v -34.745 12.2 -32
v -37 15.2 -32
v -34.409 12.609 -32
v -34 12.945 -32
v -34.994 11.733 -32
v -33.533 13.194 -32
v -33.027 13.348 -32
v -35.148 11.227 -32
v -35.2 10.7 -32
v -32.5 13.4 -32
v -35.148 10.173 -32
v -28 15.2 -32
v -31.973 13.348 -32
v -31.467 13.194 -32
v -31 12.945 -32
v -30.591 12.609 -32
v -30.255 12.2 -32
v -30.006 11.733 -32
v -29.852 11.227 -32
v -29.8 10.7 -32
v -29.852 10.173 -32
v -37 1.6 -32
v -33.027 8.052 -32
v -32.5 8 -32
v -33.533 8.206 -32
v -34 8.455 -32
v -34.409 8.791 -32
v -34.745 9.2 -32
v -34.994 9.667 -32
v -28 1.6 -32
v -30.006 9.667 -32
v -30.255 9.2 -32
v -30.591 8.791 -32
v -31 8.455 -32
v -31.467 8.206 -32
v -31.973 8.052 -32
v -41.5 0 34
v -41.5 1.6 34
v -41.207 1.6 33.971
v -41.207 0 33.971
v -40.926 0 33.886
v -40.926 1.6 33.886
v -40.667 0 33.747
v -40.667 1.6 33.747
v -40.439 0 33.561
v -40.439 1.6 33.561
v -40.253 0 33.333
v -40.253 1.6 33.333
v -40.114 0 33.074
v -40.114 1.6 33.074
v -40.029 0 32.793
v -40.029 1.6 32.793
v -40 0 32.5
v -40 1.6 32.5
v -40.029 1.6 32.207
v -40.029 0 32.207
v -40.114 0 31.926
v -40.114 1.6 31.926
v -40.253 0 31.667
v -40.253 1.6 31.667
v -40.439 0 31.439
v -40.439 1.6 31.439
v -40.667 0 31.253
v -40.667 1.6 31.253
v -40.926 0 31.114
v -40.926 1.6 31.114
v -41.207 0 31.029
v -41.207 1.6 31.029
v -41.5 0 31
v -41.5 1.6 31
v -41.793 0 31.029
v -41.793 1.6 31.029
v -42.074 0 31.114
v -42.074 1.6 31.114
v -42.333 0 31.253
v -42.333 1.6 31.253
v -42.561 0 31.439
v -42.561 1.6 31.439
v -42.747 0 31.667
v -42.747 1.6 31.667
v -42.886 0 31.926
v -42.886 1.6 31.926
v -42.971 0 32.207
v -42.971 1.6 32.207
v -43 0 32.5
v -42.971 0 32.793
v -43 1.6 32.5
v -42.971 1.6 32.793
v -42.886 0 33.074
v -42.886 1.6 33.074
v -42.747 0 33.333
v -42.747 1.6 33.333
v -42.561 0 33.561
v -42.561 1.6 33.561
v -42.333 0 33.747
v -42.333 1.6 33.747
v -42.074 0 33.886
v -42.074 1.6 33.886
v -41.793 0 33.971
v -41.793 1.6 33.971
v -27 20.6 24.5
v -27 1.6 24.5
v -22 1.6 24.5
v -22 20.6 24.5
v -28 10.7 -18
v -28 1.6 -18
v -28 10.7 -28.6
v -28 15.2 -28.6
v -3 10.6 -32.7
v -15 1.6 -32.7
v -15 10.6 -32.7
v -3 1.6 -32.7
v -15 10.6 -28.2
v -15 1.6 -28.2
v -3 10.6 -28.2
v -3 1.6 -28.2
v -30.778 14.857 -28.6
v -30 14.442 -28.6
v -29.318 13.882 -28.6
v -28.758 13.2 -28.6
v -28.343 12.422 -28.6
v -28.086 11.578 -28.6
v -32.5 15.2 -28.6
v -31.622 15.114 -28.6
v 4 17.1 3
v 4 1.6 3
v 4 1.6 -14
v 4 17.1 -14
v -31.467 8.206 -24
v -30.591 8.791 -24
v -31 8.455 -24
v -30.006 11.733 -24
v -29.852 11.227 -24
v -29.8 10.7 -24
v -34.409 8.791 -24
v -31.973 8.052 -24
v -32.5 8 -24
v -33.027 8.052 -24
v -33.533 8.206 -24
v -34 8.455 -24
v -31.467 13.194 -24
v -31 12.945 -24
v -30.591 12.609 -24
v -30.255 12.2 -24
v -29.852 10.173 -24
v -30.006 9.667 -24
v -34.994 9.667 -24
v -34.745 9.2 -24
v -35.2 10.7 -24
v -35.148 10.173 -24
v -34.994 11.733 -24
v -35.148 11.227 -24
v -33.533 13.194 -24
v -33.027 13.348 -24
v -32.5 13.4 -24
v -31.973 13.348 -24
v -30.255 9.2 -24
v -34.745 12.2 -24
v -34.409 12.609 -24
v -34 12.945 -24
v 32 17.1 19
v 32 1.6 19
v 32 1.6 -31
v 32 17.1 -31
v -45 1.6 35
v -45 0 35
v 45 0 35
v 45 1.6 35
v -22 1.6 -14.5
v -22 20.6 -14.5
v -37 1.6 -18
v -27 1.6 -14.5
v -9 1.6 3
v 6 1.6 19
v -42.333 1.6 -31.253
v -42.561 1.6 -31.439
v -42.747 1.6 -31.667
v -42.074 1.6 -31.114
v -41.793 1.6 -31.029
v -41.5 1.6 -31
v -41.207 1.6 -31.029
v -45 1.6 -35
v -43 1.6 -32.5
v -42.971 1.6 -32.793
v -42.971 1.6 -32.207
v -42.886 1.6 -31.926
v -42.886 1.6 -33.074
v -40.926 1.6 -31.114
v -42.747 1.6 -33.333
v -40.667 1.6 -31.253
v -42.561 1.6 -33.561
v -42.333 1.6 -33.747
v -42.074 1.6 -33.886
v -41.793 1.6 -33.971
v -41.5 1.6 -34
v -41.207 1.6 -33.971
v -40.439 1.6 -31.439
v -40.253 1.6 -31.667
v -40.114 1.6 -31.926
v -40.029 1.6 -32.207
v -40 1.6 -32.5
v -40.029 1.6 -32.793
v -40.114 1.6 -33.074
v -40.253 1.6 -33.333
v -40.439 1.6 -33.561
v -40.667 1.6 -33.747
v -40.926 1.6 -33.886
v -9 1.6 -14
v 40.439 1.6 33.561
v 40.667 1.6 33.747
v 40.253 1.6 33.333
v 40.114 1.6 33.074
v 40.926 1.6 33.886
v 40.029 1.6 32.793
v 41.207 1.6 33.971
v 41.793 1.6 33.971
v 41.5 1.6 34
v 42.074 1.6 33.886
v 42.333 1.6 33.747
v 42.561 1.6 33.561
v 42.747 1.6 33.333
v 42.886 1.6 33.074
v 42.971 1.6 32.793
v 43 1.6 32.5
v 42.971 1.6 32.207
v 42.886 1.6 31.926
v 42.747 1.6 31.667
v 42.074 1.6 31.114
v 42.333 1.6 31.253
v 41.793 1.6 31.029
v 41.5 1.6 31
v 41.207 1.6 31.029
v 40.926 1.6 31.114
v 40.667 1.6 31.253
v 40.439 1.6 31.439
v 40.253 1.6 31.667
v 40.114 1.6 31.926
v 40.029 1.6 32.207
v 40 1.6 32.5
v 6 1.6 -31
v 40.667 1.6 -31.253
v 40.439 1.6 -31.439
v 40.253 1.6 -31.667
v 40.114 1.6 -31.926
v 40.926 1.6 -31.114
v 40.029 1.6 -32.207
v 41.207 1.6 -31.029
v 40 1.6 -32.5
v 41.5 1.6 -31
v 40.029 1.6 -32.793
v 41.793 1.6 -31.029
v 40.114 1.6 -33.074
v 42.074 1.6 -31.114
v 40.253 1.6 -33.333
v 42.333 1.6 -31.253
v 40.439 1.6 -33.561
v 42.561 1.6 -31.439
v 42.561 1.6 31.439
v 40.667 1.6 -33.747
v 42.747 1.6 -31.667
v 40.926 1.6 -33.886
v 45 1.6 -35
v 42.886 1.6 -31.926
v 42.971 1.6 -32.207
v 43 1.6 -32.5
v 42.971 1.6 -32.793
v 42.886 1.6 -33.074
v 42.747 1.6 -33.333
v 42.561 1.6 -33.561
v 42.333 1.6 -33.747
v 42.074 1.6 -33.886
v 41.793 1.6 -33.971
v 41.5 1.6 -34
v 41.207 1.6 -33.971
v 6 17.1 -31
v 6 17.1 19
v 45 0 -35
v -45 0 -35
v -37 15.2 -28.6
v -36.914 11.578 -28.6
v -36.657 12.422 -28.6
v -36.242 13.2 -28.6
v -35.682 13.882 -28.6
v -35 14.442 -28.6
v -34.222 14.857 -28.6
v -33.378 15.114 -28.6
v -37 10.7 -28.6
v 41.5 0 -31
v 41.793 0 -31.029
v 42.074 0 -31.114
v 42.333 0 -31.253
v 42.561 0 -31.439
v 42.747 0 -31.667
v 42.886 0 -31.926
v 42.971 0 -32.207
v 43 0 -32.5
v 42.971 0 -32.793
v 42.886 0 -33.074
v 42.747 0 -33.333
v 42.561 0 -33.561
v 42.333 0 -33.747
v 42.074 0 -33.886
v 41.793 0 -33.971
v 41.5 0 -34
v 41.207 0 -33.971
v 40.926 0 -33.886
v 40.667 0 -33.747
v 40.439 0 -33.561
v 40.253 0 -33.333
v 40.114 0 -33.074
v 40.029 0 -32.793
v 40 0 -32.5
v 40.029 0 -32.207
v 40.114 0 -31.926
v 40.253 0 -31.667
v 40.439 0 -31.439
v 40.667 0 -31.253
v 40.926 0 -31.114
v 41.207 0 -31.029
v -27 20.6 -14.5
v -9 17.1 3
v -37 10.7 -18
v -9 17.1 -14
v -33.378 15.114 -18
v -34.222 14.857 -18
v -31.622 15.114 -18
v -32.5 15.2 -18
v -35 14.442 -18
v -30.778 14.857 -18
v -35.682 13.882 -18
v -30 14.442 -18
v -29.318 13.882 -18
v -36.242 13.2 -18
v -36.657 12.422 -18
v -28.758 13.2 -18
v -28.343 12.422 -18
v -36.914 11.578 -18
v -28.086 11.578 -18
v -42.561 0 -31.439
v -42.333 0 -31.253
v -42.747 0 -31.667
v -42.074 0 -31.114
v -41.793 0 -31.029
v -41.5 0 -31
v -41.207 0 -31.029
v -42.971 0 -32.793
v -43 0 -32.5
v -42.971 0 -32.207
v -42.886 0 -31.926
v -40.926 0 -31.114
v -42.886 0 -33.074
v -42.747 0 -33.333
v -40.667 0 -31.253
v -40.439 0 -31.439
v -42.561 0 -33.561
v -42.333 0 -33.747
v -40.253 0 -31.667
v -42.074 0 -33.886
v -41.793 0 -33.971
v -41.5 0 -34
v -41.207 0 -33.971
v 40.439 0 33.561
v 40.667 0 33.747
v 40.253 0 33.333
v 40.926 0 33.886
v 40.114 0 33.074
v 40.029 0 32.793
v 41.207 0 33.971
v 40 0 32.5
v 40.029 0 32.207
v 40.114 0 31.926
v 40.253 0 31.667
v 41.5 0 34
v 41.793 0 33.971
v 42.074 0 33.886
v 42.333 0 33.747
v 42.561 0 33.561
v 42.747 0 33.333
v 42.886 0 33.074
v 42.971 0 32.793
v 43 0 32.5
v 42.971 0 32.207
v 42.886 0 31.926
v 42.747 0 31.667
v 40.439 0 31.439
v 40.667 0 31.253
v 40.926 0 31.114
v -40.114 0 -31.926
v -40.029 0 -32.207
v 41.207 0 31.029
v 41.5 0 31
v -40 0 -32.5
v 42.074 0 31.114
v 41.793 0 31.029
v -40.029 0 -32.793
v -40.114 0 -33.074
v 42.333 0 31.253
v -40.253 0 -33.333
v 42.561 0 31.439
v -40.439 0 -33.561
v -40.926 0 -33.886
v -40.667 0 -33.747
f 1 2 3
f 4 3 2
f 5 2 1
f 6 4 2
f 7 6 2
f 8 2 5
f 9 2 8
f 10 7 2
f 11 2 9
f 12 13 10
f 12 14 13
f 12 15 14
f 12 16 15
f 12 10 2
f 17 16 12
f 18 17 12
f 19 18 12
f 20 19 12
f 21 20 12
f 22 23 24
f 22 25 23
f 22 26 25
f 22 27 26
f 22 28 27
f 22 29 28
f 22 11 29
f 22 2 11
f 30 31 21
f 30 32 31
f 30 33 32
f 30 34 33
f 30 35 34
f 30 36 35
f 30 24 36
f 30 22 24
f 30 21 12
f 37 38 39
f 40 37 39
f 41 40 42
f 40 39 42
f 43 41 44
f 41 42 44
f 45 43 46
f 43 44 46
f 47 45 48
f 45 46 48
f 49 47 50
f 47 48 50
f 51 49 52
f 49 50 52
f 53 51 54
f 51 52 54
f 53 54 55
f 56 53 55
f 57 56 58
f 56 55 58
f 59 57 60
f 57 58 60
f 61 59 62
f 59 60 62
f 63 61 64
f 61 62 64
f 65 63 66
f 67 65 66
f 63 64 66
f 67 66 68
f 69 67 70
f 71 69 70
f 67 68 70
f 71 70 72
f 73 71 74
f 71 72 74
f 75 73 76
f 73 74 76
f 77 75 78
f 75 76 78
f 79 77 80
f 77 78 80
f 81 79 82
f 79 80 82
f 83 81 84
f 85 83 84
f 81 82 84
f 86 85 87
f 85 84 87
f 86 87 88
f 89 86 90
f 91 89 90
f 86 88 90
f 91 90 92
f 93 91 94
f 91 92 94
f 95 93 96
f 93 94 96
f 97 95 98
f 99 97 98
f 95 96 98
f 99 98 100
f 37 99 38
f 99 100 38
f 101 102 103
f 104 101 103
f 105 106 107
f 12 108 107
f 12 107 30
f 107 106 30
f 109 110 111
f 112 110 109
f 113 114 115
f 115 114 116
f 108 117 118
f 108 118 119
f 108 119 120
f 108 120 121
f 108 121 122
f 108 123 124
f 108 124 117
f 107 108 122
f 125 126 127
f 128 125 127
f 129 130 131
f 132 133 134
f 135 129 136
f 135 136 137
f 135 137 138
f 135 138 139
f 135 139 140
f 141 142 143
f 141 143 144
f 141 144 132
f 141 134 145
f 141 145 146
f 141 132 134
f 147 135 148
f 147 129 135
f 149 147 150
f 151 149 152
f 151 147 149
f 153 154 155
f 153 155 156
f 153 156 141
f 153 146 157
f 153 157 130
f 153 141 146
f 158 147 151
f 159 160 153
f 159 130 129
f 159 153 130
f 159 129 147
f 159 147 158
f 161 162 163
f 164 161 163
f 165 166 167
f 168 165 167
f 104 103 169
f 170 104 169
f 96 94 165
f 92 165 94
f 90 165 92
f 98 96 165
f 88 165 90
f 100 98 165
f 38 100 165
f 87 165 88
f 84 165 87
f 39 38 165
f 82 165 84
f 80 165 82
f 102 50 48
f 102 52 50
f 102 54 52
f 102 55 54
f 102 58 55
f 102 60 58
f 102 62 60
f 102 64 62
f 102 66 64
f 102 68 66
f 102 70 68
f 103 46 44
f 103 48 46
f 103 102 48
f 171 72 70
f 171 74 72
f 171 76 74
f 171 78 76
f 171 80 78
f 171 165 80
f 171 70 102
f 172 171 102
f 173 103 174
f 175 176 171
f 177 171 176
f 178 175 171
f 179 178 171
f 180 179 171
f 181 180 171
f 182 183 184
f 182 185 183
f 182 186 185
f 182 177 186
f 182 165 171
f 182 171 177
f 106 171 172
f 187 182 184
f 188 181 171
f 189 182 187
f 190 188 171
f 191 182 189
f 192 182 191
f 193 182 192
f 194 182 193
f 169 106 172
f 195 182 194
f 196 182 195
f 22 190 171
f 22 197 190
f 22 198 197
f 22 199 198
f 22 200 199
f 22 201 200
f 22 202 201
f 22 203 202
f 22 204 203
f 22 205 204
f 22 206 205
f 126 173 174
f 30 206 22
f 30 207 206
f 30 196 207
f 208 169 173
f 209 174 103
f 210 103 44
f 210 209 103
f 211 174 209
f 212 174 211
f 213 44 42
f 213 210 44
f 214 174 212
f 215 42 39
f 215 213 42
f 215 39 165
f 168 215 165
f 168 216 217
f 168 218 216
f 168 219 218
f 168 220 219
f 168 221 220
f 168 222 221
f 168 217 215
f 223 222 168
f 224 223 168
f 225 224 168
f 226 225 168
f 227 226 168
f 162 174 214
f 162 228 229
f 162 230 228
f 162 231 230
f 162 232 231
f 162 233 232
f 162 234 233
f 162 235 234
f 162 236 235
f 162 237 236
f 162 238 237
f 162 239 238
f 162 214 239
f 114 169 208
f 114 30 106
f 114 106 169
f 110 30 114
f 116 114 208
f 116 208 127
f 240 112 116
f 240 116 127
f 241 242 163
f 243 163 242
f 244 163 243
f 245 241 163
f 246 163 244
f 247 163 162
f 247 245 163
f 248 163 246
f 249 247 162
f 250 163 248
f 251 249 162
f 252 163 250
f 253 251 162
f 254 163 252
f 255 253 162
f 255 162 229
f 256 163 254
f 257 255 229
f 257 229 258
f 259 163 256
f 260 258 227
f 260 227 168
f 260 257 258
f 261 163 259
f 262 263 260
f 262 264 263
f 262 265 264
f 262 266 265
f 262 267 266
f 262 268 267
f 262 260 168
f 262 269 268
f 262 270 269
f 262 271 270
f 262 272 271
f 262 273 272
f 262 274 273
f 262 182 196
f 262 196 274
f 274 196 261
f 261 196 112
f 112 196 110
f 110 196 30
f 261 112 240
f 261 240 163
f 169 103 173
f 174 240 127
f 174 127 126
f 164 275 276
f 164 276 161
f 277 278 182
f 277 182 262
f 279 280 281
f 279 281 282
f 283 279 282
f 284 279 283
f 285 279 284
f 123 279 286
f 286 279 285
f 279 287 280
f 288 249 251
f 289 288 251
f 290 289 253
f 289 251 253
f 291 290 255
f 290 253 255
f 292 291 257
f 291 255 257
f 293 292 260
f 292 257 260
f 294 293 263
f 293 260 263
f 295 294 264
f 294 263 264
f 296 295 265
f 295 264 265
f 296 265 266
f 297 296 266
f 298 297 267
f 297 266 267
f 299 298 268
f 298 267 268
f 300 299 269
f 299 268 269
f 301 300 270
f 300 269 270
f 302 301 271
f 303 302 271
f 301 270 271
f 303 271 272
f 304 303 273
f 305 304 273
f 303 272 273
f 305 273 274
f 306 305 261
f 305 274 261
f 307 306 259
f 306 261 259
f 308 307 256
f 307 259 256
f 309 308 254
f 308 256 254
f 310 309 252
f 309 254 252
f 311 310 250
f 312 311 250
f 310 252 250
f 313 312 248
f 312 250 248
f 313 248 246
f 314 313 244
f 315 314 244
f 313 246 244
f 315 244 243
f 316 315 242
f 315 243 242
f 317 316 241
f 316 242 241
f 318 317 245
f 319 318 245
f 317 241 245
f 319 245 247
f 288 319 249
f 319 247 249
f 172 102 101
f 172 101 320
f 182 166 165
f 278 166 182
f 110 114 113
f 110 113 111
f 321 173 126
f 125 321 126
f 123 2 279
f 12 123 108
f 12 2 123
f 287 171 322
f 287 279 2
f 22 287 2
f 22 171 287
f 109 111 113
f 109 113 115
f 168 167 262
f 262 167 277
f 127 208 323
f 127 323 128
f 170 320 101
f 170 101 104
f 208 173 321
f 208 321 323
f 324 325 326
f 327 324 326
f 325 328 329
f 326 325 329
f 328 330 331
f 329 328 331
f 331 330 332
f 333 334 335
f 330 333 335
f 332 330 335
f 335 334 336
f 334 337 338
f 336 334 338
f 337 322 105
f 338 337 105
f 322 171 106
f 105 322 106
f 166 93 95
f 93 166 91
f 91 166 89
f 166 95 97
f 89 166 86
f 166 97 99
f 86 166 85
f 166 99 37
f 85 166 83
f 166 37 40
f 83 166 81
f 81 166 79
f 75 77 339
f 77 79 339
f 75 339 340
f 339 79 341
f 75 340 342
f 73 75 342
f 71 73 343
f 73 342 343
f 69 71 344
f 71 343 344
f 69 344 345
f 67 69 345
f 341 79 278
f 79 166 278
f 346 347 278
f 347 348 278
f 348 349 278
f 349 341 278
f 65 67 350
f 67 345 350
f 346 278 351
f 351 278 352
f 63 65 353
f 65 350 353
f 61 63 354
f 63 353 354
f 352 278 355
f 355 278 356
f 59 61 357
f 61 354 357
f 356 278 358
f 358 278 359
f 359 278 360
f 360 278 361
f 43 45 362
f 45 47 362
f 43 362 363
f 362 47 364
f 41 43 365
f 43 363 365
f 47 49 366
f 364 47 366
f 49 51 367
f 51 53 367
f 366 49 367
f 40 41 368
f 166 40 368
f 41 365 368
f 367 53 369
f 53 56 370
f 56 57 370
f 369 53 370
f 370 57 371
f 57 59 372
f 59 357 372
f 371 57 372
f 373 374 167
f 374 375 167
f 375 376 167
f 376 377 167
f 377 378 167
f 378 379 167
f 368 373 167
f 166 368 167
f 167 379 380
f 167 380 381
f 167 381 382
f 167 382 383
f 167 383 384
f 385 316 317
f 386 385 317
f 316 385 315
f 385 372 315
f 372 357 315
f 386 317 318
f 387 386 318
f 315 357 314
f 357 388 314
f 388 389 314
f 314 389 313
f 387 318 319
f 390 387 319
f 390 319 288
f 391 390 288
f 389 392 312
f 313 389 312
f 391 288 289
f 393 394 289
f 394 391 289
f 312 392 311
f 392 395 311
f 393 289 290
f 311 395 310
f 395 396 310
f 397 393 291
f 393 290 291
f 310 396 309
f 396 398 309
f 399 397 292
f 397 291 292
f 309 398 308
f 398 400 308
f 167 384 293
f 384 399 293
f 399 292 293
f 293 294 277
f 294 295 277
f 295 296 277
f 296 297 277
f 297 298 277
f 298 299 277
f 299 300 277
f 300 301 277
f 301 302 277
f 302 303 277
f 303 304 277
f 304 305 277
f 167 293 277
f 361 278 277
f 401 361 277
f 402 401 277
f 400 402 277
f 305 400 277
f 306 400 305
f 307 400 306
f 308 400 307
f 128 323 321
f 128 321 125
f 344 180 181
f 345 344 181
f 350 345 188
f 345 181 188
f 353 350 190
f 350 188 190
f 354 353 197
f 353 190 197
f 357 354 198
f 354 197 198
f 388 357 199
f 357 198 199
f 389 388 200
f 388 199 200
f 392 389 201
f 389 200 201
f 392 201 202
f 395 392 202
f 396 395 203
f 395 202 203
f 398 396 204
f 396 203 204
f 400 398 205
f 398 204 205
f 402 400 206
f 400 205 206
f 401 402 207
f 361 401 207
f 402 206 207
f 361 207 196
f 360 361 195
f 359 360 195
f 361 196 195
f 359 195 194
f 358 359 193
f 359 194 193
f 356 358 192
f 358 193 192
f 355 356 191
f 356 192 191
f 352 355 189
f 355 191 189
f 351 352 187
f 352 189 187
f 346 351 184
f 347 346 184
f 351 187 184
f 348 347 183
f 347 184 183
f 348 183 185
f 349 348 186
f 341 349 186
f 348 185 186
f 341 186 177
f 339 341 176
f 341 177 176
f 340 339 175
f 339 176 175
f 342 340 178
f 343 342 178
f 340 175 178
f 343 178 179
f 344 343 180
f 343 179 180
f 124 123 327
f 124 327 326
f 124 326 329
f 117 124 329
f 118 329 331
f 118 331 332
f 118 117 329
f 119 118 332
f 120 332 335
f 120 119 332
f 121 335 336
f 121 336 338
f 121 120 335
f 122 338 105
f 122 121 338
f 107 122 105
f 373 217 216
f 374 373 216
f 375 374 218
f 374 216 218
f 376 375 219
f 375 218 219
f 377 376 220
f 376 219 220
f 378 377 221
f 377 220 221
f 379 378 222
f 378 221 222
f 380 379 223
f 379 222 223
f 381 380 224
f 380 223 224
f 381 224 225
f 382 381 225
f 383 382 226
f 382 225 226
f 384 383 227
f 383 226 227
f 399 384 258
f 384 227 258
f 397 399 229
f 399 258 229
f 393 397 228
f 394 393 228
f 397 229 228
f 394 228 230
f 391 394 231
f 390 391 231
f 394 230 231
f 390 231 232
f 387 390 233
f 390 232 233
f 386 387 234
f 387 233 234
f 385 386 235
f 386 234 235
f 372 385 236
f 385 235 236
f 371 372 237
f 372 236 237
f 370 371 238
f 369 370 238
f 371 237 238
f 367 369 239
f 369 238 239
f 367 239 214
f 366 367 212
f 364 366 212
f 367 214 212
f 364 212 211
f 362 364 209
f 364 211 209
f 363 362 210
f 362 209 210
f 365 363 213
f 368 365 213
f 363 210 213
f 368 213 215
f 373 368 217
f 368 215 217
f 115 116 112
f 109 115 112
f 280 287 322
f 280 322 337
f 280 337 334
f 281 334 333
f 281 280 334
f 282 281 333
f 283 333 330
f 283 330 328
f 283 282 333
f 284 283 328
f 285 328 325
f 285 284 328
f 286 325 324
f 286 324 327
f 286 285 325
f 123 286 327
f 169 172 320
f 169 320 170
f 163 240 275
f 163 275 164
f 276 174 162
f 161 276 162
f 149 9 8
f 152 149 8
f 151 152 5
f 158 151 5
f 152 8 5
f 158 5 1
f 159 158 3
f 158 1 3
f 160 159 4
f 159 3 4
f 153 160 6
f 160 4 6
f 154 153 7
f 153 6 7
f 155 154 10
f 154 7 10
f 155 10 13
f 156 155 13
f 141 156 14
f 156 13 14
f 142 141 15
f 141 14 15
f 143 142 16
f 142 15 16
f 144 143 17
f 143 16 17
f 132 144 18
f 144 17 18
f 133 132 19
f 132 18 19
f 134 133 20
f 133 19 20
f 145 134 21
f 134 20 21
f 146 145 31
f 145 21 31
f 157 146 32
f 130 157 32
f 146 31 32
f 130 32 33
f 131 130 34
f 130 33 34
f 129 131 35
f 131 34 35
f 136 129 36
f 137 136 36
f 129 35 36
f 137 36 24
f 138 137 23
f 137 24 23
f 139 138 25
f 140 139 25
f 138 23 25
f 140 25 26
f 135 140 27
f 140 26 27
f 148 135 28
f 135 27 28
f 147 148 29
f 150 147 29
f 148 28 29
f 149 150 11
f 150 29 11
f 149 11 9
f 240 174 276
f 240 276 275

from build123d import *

# Parameters (mm, degrees)
SKETCH1_W           = 90
SKETCH1_H           = 70
BOSS_EXTRUDE1_DEPTH = 1.6
SKETCH2_R           = 1.5
CUT_EXTRUDE1_DEPTH  = 1.6
SKETCH3_W           = 5
SKETCH3_H           = 39
BOSS_EXTRUDE2_DEPTH = 19
SKETCH4_W           = 26
SKETCH4_H           = 50
SKETCH4_W_2         = 13
SKETCH4_H_2         = 17
BOSS_EXTRUDE3_DEPTH = 15.5
SKETCH5_W           = 9
SKETCH5_H           = 14
BOSS_EXTRUDE4_DEPTH = 13.6
SKETCH6_R           = 2.7
CUT_EXTRUDE2_DEPTH  = 8
FILLET1_START       = -28.6
FILLET1_DEPTH       = 10.6
SKETCH7_W           = 12
SKETCH7_H           = 4.5
BOSS_EXTRUDE5_DEPTH = 9


with BuildPart() as part:
    # Sketch1 → Boss-Extrude1 (new body)
    with BuildSketch(Plane(origin=(0, 0, 0), x_dir=(1, 0, 0), z_dir=(0, 1, 0))):
        Rectangle(SKETCH1_W, SKETCH1_H)
    extrude(amount=BOSS_EXTRUDE1_DEPTH)

    # Sketch2 → Cut-Extrude1 (cut)
    with BuildSketch(Plane(origin=(0, 1.6, 0), x_dir=(1, 0, 0), z_dir=(0, 1, 0))):
        with Locations(Location((-41.5, 32.5, 0), (0, 0, 270))):
            Circle(SKETCH2_R)
        with Locations(Location((41.5, 32.5, 0), (0, 0, 270))):
            Circle(SKETCH2_R)
        with Locations(Location((41.5, -32.5, 0), (0, 0, 270))):
            Circle(SKETCH2_R)
        with Locations(Location((-41.5, -32.5, 0), (0, 0, 270))):
            Circle(SKETCH2_R)
    extrude(amount=-CUT_EXTRUDE1_DEPTH, mode=Mode.SUBTRACT)

    # Sketch3 → Boss-Extrude2 (add)
    with BuildSketch(Plane(origin=(0, 1.6, 0), x_dir=(1, 0, 0), z_dir=(0, 1, 0))):
        with Locations((-24.5, -5)):
            Rectangle(SKETCH3_W, SKETCH3_H)
    extrude(amount=BOSS_EXTRUDE2_DEPTH)

    # Sketch4 → Boss-Extrude3 (add)
    with BuildSketch(Plane(origin=(0, 1.6, 0), x_dir=(1, 0, 0), z_dir=(0, 1, 0))):
        with Locations((19, 6)):
            Rectangle(SKETCH4_W, SKETCH4_H)
        with Locations((-2.5, 5.5)):
            Rectangle(SKETCH4_W_2, SKETCH4_H_2)
    extrude(amount=BOSS_EXTRUDE3_DEPTH)

    # Sketch5 → Boss-Extrude4 (add)
    with BuildSketch(Plane(origin=(0, 1.6, 0), x_dir=(1, 0, 0), z_dir=(0, 1, 0))):
        with Locations((-32.5, 25)):
            Rectangle(SKETCH5_W, SKETCH5_H)
    extrude(amount=BOSS_EXTRUDE4_DEPTH)

    # Sketch6 → Cut-Extrude2 (cut)
    with BuildSketch(Plane(origin=(0, 0, -32), x_dir=(-1, 0, 0), z_dir=(0, 0, -1))):
        with Locations((32.5, 10.7)):
            Circle(SKETCH6_R)
    extrude(amount=-CUT_EXTRUDE2_DEPTH, mode=Mode.SUBTRACT)

    # Fillet1: read off the stored shape, not the designer's step
    # Fillet1 outline → Fillet1 (cut)
    with BuildSketch(Plane.XY.offset(FILLET1_START)):
        with BuildLine():
            Line((-28, 15.2), (-32.5, 15.2))
            ThreePointArc((-32.5, 15.2), (-29.318019485, 13.881980515), (-28, 10.7))
            Line((-28, 10.7), (-28, 15.2))
        make_face()
        with BuildLine():
            ThreePointArc((-37, 10.7), (-35.681980515, 13.881980515), (-32.5, 15.2))
            Line((-32.5, 15.2), (-37, 15.2))
            Line((-37, 15.2), (-37, 10.7))
        make_face()
    extrude(amount=FILLET1_DEPTH, mode=Mode.SUBTRACT)

    # Sketch7 → Boss-Extrude5 (add)
    with BuildSketch(Plane(origin=(0, 1.6, 0), x_dir=(1, 0, 0), z_dir=(0, 1, 0))):
        with Locations((-9, 30.45)):
            Rectangle(SKETCH7_W, SKETCH7_H)
    extrude(amount=BOSS_EXTRUDE5_DEPTH)


solid = part.part
